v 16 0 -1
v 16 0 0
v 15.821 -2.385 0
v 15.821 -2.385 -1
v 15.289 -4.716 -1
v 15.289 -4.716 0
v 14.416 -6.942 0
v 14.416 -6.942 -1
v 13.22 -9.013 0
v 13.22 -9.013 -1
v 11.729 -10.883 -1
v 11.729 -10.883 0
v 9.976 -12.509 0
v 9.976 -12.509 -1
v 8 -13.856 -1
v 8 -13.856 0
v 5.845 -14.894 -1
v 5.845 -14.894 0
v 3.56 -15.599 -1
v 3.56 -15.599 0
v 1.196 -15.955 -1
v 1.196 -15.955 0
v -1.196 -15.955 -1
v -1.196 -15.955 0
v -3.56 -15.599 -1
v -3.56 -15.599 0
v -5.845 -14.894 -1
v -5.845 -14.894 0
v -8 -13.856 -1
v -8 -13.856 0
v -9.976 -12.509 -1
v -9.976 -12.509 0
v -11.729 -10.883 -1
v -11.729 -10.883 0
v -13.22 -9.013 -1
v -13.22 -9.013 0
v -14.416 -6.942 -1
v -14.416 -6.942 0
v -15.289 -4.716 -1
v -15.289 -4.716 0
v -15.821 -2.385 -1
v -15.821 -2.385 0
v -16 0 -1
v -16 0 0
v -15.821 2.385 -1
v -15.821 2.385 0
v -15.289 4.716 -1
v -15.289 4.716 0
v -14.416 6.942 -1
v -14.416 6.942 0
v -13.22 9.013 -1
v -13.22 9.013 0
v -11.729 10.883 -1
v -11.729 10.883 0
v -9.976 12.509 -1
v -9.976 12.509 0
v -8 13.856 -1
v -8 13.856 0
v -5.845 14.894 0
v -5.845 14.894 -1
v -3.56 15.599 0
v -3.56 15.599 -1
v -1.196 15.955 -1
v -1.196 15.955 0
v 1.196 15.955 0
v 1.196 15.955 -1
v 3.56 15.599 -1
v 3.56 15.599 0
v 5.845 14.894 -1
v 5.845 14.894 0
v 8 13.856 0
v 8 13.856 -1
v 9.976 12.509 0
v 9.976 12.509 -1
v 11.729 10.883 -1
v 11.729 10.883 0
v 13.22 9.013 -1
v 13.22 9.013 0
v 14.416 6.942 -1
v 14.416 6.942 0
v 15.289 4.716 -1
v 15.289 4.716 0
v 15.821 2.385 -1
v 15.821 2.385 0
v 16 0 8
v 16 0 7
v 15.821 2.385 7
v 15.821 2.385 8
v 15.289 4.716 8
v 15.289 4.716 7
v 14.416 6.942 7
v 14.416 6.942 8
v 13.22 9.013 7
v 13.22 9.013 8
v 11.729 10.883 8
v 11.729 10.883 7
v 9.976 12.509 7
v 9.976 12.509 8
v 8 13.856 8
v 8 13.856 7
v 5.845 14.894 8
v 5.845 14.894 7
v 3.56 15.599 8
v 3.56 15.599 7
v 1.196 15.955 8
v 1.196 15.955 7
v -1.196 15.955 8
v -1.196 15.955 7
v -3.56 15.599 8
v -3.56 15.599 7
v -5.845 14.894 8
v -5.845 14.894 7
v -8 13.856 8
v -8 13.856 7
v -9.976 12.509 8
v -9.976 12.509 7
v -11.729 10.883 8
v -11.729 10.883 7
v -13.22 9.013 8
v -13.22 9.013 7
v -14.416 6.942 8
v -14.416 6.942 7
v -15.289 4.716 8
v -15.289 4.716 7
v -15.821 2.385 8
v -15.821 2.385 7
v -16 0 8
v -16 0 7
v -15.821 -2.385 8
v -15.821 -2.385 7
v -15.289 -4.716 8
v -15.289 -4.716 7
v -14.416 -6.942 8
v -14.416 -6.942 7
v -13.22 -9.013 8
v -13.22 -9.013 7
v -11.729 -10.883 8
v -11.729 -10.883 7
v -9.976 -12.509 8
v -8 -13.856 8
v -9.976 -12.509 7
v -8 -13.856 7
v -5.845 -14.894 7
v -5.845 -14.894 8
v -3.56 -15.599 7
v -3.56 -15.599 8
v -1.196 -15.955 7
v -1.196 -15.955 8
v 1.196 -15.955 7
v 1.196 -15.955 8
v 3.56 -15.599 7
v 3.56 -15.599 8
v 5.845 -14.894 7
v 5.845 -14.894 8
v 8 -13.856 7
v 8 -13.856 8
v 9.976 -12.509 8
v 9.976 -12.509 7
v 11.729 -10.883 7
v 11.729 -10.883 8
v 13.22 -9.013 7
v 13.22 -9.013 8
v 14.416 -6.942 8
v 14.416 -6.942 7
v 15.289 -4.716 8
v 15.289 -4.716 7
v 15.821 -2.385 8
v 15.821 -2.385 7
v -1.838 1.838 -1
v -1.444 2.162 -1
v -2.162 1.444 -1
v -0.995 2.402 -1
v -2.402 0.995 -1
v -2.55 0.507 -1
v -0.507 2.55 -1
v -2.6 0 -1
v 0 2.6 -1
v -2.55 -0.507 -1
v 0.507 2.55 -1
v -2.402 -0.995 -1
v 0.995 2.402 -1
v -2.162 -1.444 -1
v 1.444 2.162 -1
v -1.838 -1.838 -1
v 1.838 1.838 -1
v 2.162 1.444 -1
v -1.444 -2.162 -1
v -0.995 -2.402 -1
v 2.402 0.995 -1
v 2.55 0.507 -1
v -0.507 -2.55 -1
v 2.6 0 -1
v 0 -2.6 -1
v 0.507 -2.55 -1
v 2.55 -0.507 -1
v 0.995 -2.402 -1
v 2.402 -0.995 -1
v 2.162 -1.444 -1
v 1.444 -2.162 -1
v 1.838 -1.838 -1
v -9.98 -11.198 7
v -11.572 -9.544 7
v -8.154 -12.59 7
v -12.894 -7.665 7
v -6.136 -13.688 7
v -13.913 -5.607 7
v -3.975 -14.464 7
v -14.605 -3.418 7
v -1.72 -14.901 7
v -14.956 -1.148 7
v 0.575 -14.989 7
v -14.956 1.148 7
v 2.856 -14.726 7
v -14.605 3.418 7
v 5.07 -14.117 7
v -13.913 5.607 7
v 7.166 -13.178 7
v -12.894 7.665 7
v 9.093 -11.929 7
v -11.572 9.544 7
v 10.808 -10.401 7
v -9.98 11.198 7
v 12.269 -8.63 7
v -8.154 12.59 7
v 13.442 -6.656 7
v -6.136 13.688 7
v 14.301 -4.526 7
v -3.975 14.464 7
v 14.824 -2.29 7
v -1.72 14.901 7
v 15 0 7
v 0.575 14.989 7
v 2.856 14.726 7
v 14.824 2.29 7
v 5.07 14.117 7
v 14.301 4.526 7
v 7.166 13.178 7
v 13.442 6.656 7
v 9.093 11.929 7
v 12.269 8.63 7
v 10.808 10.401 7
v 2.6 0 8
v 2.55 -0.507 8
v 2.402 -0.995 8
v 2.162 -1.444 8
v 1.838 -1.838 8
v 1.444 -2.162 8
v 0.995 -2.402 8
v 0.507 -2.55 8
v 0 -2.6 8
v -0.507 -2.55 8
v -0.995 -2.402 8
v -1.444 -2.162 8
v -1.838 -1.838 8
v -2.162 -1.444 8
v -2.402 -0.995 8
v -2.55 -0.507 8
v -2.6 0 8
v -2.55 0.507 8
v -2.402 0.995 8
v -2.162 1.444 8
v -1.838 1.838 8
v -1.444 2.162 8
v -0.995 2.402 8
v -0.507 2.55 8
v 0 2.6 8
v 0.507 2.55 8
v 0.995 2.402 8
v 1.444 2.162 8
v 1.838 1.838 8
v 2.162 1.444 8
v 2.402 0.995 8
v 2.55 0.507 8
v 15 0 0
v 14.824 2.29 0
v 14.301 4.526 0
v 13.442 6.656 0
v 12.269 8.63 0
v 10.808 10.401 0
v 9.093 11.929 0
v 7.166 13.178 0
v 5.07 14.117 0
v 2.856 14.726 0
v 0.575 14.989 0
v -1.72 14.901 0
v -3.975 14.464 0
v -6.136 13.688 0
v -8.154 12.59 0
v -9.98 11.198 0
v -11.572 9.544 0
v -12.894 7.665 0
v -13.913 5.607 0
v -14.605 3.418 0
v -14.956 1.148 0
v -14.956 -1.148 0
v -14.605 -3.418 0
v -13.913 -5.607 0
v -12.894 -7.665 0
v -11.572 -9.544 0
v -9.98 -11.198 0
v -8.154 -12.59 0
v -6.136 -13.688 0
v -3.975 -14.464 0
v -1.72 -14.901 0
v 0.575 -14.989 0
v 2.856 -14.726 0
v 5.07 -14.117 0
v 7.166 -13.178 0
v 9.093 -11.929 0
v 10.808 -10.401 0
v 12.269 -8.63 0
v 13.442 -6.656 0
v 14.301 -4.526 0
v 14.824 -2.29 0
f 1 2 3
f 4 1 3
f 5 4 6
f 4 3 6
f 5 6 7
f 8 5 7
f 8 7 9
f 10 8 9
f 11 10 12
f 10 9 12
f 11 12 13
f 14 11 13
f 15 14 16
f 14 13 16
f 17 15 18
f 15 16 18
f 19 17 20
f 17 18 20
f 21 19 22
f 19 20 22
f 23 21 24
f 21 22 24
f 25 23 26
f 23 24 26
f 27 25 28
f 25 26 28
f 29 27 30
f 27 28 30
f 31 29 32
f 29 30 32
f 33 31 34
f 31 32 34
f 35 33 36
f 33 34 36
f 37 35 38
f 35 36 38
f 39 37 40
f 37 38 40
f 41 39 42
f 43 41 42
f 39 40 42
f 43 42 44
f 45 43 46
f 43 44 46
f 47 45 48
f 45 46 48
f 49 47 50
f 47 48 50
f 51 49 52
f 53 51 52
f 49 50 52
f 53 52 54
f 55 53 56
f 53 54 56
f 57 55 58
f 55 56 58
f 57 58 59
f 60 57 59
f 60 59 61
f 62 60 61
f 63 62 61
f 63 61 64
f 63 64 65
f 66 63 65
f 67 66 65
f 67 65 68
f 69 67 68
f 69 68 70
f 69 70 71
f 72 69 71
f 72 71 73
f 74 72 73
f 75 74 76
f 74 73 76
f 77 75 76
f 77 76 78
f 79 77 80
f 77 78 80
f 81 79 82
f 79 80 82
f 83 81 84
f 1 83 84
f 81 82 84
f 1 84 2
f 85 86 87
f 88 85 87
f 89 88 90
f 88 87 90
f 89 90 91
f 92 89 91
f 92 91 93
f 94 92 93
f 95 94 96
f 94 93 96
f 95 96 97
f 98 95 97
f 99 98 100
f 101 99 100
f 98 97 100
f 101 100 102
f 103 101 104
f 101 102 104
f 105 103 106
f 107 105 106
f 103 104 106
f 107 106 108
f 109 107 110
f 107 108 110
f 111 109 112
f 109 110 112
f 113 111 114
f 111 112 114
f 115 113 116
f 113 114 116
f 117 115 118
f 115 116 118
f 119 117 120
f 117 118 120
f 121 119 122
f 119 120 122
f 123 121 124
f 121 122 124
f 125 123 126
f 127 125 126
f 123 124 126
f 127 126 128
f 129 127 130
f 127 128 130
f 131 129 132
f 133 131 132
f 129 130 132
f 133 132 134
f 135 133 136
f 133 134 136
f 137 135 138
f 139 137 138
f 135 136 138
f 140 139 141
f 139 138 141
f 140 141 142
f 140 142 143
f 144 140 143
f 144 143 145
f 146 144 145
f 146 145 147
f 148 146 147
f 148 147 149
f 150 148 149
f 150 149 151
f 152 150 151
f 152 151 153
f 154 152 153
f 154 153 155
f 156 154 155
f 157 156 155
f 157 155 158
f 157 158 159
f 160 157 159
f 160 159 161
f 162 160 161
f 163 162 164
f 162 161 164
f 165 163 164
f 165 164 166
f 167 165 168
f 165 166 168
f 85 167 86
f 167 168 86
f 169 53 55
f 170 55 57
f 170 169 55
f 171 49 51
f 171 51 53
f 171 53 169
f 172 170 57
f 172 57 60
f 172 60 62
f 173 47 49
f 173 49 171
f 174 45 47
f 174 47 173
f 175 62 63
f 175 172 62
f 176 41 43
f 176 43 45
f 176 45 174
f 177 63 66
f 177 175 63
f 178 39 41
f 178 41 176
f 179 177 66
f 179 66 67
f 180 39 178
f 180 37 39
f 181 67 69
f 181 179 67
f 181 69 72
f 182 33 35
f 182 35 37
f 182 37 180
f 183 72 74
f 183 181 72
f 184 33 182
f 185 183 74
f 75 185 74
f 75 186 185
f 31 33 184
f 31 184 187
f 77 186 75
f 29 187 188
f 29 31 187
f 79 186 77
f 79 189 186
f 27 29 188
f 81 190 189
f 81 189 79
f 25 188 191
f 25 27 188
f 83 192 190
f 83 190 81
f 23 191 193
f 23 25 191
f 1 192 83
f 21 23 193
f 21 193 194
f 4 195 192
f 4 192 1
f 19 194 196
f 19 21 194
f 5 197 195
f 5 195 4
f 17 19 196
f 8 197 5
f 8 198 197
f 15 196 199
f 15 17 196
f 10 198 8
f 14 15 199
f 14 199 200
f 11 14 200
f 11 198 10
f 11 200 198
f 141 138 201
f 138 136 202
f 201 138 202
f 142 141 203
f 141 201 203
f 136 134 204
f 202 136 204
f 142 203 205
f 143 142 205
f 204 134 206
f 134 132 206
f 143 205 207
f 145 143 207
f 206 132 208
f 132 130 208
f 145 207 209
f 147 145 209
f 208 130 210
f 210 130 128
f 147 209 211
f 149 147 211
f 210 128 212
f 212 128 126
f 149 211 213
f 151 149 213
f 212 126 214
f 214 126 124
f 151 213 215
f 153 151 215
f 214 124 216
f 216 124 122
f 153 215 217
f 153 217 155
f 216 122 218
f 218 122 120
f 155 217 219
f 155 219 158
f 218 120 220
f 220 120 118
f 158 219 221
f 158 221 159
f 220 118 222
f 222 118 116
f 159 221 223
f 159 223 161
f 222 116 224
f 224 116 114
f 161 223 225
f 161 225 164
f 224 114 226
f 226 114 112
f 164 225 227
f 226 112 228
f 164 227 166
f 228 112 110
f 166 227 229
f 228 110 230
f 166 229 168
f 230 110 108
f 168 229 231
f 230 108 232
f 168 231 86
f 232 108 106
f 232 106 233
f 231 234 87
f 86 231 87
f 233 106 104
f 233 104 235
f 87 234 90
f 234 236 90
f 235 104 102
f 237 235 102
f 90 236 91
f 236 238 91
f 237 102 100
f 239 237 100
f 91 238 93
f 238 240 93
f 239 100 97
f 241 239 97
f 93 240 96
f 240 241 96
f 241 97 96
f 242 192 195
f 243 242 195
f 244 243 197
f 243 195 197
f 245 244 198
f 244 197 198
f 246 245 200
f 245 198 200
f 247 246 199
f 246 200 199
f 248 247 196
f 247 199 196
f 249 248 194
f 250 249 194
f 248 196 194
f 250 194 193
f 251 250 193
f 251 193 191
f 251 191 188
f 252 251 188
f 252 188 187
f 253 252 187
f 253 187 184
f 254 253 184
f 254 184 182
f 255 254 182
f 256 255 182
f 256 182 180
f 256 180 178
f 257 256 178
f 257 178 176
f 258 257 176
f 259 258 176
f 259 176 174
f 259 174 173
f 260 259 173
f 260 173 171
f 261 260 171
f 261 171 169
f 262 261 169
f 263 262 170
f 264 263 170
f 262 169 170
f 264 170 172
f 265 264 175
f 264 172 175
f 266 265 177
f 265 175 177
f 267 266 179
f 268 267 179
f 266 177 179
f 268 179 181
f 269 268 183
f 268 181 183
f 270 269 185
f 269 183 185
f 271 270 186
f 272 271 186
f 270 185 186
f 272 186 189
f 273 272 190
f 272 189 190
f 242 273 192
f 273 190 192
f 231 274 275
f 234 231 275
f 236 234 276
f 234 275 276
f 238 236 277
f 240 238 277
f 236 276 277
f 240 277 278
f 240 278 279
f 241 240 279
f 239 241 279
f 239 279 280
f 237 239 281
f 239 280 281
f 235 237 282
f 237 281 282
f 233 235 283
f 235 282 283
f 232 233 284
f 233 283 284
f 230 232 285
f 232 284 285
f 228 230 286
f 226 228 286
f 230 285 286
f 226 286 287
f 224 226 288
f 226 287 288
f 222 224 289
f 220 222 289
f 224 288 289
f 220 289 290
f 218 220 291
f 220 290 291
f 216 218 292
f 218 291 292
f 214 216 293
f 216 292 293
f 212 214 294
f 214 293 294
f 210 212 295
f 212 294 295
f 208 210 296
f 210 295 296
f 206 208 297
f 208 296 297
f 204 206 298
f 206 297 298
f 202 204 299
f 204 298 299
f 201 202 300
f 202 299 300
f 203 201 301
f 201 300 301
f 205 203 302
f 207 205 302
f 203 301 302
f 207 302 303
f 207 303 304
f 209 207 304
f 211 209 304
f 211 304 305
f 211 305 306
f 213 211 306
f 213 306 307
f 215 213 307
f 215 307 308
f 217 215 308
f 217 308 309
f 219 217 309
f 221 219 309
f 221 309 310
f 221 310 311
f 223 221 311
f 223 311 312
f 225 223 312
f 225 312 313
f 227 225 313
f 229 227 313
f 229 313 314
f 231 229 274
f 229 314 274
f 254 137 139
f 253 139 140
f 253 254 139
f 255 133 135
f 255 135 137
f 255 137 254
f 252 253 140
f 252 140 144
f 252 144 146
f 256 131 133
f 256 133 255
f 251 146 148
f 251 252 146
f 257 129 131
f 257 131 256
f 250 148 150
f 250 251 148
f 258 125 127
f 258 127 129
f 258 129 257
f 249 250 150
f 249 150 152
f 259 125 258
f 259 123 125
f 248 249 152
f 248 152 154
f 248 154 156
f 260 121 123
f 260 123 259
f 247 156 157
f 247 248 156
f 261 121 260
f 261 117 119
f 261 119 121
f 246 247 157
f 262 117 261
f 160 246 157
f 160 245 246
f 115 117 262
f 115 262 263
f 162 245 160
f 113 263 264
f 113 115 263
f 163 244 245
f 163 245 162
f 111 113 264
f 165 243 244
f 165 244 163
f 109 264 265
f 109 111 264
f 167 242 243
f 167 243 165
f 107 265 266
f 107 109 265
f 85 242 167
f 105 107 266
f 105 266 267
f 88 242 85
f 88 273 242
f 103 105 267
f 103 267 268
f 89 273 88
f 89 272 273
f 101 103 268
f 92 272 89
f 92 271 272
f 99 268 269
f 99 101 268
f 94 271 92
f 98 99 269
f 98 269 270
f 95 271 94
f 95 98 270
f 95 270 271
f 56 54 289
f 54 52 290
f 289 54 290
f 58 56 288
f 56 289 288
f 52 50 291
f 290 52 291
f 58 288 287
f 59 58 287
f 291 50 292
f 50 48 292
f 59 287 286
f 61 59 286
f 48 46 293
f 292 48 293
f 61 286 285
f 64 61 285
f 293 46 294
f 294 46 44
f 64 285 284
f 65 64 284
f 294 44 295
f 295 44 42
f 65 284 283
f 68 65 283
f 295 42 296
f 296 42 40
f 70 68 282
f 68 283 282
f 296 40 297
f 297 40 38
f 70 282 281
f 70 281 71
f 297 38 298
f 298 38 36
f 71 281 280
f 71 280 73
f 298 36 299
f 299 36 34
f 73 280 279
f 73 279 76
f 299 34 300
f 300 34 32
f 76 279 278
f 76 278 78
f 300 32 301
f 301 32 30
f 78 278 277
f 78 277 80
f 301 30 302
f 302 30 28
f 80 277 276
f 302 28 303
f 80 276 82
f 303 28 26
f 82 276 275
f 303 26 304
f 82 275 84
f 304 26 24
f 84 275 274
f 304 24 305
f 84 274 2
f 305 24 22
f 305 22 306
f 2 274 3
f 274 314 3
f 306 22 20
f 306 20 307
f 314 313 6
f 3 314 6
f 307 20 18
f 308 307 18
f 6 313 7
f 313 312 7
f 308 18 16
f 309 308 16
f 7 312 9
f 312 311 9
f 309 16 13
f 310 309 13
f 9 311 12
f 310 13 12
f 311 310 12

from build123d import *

# Parameters (mm, degrees)
SKETCH_R     = 15
PAD_DEPTH    = 7
SKETCH001_R  = 16
PAD001_DEPTH = 1
SKETCH002_R  = 16
PAD002_DEPTH = 1
SKETCH003_R  = 2.6
POCKET_DEPTH = 9.001


with BuildPart() as part:
    # Sketch → Pad (new body)
    with BuildSketch(Plane.XY):
        Circle(SKETCH_R)
    extrude(amount=PAD_DEPTH)

    # Sketch001 (on Face3 of Pad) → Pad001 (join)
    with BuildSketch(Plane.XY.offset(7)):
        Circle(SKETCH001_R)
    extrude(amount=PAD001_DEPTH)

    # Sketch002 (on Face2 of Pad001) → Pad002 (join)
    with BuildSketch(Plane(origin=(0, 0, 0), x_dir=(1, 0, 0), z_dir=(0, 0, -1))):
        Circle(SKETCH002_R)
    extrude(amount=PAD002_DEPTH)

    # Sketch003 (on Face6 of Pad002) → Pocket (cut, through all)
    with BuildSketch(Plane(origin=(0, 0, -1), x_dir=(1, 0, 0), z_dir=(0, 0, -1))):
        Circle(SKETCH003_R)
    extrude(amount=-POCKET_DEPTH, mode=Mode.SUBTRACT)


solid = part.part
